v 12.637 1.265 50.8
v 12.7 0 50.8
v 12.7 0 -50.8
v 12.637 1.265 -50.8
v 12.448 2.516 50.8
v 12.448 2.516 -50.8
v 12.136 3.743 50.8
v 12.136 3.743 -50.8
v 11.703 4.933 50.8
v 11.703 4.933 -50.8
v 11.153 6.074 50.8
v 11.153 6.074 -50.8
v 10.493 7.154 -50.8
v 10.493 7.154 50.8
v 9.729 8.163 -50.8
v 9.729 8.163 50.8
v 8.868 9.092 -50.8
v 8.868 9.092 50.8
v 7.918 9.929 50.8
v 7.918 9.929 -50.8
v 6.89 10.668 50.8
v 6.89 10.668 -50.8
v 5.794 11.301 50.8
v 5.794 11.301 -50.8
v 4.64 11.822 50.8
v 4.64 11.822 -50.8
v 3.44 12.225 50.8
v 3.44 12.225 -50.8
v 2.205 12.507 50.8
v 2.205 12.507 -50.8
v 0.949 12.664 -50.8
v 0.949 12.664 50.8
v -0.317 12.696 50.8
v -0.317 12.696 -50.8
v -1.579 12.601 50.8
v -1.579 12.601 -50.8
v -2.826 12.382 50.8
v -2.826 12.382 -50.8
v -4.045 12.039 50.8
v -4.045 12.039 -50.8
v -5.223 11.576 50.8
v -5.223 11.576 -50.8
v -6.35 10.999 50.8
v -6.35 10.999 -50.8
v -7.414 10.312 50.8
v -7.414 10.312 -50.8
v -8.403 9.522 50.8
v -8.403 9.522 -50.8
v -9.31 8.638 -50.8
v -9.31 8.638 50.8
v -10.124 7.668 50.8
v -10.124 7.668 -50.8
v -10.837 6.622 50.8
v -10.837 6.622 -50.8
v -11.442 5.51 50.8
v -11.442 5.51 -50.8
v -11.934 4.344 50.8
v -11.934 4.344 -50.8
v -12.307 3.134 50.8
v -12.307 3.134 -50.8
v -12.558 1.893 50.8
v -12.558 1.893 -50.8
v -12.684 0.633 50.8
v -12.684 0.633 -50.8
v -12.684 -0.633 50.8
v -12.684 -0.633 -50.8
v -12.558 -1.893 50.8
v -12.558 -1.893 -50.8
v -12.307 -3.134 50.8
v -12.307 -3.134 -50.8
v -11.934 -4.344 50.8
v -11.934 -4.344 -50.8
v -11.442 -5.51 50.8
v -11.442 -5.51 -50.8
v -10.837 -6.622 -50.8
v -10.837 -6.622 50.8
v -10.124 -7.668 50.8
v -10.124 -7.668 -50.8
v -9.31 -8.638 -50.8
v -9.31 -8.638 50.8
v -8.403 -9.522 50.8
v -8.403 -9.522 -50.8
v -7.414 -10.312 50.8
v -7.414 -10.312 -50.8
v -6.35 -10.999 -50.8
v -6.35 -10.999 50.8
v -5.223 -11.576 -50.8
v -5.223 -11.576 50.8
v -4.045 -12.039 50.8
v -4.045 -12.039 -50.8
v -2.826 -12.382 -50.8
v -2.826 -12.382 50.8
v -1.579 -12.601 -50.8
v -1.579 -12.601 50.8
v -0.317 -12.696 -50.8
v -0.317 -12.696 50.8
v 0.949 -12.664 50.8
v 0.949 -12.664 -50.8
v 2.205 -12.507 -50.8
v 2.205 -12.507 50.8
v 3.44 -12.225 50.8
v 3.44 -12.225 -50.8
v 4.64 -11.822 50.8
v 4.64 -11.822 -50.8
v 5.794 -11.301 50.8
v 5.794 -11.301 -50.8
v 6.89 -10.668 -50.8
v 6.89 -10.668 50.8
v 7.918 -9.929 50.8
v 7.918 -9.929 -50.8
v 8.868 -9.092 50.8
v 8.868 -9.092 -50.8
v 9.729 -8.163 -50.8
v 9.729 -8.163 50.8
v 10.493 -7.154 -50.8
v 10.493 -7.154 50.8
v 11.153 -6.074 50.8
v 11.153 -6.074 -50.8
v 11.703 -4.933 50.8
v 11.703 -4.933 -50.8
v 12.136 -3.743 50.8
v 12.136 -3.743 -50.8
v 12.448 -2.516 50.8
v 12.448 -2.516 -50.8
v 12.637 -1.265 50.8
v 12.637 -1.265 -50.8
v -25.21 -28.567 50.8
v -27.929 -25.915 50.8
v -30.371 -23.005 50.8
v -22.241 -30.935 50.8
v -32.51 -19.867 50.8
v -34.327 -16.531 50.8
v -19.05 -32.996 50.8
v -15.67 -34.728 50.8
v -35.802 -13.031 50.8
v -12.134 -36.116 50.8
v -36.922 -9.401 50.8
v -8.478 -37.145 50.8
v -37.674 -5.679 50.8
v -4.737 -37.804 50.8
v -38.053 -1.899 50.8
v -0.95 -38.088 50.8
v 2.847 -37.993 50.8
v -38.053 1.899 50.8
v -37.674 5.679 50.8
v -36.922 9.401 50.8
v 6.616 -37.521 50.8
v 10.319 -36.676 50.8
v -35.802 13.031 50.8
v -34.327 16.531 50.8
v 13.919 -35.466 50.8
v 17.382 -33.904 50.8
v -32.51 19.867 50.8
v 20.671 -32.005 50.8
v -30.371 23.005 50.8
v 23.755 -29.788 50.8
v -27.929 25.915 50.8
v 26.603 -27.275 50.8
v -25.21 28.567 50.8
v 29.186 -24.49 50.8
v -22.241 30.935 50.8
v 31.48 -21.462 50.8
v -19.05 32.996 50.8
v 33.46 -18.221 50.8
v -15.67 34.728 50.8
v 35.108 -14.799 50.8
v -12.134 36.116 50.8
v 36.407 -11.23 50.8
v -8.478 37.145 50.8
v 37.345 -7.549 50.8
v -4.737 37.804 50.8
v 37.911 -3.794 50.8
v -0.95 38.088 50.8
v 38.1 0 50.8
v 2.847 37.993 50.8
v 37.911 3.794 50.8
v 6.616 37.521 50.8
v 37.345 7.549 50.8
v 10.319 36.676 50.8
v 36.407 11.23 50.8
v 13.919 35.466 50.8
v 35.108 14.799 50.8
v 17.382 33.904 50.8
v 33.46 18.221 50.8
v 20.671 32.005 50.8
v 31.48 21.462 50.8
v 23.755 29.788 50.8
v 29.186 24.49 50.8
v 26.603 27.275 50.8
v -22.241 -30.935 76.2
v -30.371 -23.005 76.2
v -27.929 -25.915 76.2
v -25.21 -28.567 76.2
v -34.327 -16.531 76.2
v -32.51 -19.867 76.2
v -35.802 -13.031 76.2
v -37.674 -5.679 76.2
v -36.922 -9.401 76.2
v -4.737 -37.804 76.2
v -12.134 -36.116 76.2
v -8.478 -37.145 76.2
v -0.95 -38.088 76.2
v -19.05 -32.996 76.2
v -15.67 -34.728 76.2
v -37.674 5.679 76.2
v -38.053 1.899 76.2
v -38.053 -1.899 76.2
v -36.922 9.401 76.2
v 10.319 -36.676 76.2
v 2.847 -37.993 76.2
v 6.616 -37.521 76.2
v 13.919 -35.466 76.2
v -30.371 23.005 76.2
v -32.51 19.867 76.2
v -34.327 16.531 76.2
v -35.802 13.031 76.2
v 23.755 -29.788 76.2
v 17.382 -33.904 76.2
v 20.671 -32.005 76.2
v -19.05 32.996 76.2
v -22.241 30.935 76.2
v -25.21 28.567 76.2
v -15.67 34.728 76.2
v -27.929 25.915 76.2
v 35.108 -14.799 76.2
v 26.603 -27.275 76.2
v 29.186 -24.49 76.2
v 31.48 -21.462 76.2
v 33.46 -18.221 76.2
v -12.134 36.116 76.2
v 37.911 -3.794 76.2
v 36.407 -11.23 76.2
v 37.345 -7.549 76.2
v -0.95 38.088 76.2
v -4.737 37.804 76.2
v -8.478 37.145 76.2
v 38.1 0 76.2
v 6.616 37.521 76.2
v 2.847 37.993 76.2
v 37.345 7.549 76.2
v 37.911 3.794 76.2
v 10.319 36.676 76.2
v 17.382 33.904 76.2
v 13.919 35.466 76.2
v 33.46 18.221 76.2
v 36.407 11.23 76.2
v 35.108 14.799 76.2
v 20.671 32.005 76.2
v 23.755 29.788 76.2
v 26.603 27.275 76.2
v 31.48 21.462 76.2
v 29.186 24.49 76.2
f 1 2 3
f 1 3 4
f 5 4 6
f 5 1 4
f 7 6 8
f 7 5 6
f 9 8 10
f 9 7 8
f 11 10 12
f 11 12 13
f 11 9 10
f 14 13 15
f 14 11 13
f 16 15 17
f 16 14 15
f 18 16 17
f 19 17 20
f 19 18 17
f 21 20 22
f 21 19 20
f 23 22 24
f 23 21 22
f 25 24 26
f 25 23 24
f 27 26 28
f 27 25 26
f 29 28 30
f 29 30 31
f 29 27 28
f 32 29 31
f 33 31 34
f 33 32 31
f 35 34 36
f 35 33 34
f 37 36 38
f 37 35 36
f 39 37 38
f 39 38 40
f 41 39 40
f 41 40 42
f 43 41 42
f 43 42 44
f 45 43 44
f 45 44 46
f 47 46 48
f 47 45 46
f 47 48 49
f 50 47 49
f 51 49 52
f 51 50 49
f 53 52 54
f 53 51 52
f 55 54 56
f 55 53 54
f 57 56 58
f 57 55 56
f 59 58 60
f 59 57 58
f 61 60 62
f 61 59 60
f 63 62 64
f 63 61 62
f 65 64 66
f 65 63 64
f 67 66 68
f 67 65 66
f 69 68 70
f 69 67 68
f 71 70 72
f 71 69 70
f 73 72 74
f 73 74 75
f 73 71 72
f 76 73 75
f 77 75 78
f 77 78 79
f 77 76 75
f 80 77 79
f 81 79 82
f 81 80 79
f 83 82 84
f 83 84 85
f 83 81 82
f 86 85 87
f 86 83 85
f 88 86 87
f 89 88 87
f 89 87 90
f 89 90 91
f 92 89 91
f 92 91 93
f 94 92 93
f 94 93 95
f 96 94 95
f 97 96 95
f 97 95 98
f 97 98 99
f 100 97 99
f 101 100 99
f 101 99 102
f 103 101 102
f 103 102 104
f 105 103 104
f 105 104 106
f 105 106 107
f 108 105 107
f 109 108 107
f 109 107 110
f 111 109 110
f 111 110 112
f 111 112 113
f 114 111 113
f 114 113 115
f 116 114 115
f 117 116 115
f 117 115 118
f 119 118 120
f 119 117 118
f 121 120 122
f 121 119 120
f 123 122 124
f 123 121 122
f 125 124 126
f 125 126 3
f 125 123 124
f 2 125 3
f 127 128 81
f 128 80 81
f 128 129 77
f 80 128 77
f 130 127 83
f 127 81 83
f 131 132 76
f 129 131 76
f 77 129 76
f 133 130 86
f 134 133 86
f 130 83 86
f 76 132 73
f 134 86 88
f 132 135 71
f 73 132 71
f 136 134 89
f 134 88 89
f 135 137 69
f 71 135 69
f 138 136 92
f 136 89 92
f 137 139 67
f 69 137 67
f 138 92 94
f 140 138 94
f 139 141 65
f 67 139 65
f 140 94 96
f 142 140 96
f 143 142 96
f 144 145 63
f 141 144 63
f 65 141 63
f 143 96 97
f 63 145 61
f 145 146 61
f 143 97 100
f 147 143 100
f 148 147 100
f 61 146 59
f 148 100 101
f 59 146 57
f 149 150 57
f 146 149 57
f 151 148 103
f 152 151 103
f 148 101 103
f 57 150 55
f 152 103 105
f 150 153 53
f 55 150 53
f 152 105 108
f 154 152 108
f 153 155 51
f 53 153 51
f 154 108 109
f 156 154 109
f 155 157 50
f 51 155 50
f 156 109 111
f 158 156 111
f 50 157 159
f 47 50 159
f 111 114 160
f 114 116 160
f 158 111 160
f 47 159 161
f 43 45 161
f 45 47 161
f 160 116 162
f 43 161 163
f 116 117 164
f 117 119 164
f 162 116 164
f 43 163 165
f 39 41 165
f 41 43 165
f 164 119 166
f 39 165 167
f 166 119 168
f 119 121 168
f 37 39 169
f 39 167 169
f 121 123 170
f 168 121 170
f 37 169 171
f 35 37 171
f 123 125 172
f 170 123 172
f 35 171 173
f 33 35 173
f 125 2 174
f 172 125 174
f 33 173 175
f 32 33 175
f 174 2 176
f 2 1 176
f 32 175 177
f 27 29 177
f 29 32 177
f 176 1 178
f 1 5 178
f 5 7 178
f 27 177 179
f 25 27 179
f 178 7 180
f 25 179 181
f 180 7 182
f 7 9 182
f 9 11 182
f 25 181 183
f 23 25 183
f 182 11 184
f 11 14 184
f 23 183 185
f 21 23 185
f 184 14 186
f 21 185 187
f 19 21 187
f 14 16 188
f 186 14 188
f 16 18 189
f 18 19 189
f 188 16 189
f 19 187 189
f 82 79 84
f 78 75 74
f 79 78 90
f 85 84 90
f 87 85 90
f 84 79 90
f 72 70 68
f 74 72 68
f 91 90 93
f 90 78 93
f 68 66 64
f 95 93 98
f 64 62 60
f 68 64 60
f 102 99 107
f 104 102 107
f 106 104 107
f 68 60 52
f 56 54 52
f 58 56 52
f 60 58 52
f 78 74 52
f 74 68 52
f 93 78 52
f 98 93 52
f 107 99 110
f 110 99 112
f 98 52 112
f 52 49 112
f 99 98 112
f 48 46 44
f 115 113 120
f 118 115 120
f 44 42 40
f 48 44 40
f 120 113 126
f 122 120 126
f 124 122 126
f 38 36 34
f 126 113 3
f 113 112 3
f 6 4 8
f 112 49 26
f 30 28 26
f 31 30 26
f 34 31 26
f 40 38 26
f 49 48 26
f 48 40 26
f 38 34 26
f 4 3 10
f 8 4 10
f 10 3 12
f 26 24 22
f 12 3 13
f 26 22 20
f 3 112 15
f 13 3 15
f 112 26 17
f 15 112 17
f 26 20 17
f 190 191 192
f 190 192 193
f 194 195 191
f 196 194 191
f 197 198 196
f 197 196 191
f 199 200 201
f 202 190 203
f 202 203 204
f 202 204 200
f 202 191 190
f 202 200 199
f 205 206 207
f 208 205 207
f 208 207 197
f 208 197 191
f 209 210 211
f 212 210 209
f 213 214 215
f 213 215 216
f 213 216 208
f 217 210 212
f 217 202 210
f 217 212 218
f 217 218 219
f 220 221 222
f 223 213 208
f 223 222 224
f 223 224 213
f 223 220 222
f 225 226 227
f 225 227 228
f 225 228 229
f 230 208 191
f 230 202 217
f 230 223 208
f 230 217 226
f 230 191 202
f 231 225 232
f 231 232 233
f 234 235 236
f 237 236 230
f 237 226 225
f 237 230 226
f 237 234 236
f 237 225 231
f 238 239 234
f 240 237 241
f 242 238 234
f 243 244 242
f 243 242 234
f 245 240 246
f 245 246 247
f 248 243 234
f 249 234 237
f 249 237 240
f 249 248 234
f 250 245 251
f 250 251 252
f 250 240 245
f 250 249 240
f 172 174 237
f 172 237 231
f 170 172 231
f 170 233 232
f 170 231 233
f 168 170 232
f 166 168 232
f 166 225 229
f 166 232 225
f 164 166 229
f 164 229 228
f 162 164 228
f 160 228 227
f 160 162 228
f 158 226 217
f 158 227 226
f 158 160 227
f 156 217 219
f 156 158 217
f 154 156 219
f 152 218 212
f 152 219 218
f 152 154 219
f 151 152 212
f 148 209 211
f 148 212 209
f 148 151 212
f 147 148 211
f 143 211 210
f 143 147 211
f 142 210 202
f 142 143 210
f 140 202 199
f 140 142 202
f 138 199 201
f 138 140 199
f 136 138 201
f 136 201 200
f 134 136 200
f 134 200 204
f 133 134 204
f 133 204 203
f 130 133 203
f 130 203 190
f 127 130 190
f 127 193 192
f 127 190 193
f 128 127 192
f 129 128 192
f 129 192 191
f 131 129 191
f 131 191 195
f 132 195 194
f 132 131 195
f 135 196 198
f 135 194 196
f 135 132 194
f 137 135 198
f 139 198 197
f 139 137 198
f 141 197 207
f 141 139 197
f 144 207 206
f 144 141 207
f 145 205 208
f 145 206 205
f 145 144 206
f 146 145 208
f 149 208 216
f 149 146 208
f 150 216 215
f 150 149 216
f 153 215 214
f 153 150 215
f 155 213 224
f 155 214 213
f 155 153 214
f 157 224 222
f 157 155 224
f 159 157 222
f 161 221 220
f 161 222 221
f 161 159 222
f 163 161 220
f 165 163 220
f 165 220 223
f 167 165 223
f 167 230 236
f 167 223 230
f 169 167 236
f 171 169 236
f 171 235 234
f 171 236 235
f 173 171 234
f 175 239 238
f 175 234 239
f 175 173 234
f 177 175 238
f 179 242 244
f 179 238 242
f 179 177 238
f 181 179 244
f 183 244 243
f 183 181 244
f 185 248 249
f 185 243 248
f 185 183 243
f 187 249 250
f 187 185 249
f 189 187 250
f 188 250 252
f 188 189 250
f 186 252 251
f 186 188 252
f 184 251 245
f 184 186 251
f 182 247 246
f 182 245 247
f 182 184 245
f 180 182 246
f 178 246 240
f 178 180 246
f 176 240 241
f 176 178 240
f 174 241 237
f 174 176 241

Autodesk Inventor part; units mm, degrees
ref_plane "YZ Plane" through (0, 0, 0) normal (1, 0, 0) x (0, 1, 0)
ref_plane "Work Plane1" through (0, 0, 0) normal (0, 0, 1) x (1, 0, 0)
sketch "Sketch1" plane through (0, 0, 0) normal (0, 0, 1) x (1, 0, 0)
  circle A0 centre (0, 0) radius 12.7
  dimension "d0" = 25.4
extrude "Extrusion1" add sketch "Sketch1" against normal blind 50.8
sketch "Sketch2" plane through (0, 0, 0) normal (0, 0, 1) x (1, 0, 0)
  circle A0 centre (0, 0) radius 12.7
extrude "Extrusion2" add sketch "Sketch2" along normal blind 50.8
sketch "Sketch4" plane through (0, 0, 50.8) normal (0, 0, 1) x (1, 0, 0)
  circle A0 centre (0, 0) radius 38.1
  dimension "d6" = 76.2
extrude "Extrusion3" add sketch "Sketch4" along normal blind 25.4
ref_plane "Work Plane2" through (175.2488, -178.5172, -25.4) normal (0, 0, 1) x (0.3503, -0.9366, 0)
properties part number "clutch02-releaseMechanism" material "PET Plastic"
